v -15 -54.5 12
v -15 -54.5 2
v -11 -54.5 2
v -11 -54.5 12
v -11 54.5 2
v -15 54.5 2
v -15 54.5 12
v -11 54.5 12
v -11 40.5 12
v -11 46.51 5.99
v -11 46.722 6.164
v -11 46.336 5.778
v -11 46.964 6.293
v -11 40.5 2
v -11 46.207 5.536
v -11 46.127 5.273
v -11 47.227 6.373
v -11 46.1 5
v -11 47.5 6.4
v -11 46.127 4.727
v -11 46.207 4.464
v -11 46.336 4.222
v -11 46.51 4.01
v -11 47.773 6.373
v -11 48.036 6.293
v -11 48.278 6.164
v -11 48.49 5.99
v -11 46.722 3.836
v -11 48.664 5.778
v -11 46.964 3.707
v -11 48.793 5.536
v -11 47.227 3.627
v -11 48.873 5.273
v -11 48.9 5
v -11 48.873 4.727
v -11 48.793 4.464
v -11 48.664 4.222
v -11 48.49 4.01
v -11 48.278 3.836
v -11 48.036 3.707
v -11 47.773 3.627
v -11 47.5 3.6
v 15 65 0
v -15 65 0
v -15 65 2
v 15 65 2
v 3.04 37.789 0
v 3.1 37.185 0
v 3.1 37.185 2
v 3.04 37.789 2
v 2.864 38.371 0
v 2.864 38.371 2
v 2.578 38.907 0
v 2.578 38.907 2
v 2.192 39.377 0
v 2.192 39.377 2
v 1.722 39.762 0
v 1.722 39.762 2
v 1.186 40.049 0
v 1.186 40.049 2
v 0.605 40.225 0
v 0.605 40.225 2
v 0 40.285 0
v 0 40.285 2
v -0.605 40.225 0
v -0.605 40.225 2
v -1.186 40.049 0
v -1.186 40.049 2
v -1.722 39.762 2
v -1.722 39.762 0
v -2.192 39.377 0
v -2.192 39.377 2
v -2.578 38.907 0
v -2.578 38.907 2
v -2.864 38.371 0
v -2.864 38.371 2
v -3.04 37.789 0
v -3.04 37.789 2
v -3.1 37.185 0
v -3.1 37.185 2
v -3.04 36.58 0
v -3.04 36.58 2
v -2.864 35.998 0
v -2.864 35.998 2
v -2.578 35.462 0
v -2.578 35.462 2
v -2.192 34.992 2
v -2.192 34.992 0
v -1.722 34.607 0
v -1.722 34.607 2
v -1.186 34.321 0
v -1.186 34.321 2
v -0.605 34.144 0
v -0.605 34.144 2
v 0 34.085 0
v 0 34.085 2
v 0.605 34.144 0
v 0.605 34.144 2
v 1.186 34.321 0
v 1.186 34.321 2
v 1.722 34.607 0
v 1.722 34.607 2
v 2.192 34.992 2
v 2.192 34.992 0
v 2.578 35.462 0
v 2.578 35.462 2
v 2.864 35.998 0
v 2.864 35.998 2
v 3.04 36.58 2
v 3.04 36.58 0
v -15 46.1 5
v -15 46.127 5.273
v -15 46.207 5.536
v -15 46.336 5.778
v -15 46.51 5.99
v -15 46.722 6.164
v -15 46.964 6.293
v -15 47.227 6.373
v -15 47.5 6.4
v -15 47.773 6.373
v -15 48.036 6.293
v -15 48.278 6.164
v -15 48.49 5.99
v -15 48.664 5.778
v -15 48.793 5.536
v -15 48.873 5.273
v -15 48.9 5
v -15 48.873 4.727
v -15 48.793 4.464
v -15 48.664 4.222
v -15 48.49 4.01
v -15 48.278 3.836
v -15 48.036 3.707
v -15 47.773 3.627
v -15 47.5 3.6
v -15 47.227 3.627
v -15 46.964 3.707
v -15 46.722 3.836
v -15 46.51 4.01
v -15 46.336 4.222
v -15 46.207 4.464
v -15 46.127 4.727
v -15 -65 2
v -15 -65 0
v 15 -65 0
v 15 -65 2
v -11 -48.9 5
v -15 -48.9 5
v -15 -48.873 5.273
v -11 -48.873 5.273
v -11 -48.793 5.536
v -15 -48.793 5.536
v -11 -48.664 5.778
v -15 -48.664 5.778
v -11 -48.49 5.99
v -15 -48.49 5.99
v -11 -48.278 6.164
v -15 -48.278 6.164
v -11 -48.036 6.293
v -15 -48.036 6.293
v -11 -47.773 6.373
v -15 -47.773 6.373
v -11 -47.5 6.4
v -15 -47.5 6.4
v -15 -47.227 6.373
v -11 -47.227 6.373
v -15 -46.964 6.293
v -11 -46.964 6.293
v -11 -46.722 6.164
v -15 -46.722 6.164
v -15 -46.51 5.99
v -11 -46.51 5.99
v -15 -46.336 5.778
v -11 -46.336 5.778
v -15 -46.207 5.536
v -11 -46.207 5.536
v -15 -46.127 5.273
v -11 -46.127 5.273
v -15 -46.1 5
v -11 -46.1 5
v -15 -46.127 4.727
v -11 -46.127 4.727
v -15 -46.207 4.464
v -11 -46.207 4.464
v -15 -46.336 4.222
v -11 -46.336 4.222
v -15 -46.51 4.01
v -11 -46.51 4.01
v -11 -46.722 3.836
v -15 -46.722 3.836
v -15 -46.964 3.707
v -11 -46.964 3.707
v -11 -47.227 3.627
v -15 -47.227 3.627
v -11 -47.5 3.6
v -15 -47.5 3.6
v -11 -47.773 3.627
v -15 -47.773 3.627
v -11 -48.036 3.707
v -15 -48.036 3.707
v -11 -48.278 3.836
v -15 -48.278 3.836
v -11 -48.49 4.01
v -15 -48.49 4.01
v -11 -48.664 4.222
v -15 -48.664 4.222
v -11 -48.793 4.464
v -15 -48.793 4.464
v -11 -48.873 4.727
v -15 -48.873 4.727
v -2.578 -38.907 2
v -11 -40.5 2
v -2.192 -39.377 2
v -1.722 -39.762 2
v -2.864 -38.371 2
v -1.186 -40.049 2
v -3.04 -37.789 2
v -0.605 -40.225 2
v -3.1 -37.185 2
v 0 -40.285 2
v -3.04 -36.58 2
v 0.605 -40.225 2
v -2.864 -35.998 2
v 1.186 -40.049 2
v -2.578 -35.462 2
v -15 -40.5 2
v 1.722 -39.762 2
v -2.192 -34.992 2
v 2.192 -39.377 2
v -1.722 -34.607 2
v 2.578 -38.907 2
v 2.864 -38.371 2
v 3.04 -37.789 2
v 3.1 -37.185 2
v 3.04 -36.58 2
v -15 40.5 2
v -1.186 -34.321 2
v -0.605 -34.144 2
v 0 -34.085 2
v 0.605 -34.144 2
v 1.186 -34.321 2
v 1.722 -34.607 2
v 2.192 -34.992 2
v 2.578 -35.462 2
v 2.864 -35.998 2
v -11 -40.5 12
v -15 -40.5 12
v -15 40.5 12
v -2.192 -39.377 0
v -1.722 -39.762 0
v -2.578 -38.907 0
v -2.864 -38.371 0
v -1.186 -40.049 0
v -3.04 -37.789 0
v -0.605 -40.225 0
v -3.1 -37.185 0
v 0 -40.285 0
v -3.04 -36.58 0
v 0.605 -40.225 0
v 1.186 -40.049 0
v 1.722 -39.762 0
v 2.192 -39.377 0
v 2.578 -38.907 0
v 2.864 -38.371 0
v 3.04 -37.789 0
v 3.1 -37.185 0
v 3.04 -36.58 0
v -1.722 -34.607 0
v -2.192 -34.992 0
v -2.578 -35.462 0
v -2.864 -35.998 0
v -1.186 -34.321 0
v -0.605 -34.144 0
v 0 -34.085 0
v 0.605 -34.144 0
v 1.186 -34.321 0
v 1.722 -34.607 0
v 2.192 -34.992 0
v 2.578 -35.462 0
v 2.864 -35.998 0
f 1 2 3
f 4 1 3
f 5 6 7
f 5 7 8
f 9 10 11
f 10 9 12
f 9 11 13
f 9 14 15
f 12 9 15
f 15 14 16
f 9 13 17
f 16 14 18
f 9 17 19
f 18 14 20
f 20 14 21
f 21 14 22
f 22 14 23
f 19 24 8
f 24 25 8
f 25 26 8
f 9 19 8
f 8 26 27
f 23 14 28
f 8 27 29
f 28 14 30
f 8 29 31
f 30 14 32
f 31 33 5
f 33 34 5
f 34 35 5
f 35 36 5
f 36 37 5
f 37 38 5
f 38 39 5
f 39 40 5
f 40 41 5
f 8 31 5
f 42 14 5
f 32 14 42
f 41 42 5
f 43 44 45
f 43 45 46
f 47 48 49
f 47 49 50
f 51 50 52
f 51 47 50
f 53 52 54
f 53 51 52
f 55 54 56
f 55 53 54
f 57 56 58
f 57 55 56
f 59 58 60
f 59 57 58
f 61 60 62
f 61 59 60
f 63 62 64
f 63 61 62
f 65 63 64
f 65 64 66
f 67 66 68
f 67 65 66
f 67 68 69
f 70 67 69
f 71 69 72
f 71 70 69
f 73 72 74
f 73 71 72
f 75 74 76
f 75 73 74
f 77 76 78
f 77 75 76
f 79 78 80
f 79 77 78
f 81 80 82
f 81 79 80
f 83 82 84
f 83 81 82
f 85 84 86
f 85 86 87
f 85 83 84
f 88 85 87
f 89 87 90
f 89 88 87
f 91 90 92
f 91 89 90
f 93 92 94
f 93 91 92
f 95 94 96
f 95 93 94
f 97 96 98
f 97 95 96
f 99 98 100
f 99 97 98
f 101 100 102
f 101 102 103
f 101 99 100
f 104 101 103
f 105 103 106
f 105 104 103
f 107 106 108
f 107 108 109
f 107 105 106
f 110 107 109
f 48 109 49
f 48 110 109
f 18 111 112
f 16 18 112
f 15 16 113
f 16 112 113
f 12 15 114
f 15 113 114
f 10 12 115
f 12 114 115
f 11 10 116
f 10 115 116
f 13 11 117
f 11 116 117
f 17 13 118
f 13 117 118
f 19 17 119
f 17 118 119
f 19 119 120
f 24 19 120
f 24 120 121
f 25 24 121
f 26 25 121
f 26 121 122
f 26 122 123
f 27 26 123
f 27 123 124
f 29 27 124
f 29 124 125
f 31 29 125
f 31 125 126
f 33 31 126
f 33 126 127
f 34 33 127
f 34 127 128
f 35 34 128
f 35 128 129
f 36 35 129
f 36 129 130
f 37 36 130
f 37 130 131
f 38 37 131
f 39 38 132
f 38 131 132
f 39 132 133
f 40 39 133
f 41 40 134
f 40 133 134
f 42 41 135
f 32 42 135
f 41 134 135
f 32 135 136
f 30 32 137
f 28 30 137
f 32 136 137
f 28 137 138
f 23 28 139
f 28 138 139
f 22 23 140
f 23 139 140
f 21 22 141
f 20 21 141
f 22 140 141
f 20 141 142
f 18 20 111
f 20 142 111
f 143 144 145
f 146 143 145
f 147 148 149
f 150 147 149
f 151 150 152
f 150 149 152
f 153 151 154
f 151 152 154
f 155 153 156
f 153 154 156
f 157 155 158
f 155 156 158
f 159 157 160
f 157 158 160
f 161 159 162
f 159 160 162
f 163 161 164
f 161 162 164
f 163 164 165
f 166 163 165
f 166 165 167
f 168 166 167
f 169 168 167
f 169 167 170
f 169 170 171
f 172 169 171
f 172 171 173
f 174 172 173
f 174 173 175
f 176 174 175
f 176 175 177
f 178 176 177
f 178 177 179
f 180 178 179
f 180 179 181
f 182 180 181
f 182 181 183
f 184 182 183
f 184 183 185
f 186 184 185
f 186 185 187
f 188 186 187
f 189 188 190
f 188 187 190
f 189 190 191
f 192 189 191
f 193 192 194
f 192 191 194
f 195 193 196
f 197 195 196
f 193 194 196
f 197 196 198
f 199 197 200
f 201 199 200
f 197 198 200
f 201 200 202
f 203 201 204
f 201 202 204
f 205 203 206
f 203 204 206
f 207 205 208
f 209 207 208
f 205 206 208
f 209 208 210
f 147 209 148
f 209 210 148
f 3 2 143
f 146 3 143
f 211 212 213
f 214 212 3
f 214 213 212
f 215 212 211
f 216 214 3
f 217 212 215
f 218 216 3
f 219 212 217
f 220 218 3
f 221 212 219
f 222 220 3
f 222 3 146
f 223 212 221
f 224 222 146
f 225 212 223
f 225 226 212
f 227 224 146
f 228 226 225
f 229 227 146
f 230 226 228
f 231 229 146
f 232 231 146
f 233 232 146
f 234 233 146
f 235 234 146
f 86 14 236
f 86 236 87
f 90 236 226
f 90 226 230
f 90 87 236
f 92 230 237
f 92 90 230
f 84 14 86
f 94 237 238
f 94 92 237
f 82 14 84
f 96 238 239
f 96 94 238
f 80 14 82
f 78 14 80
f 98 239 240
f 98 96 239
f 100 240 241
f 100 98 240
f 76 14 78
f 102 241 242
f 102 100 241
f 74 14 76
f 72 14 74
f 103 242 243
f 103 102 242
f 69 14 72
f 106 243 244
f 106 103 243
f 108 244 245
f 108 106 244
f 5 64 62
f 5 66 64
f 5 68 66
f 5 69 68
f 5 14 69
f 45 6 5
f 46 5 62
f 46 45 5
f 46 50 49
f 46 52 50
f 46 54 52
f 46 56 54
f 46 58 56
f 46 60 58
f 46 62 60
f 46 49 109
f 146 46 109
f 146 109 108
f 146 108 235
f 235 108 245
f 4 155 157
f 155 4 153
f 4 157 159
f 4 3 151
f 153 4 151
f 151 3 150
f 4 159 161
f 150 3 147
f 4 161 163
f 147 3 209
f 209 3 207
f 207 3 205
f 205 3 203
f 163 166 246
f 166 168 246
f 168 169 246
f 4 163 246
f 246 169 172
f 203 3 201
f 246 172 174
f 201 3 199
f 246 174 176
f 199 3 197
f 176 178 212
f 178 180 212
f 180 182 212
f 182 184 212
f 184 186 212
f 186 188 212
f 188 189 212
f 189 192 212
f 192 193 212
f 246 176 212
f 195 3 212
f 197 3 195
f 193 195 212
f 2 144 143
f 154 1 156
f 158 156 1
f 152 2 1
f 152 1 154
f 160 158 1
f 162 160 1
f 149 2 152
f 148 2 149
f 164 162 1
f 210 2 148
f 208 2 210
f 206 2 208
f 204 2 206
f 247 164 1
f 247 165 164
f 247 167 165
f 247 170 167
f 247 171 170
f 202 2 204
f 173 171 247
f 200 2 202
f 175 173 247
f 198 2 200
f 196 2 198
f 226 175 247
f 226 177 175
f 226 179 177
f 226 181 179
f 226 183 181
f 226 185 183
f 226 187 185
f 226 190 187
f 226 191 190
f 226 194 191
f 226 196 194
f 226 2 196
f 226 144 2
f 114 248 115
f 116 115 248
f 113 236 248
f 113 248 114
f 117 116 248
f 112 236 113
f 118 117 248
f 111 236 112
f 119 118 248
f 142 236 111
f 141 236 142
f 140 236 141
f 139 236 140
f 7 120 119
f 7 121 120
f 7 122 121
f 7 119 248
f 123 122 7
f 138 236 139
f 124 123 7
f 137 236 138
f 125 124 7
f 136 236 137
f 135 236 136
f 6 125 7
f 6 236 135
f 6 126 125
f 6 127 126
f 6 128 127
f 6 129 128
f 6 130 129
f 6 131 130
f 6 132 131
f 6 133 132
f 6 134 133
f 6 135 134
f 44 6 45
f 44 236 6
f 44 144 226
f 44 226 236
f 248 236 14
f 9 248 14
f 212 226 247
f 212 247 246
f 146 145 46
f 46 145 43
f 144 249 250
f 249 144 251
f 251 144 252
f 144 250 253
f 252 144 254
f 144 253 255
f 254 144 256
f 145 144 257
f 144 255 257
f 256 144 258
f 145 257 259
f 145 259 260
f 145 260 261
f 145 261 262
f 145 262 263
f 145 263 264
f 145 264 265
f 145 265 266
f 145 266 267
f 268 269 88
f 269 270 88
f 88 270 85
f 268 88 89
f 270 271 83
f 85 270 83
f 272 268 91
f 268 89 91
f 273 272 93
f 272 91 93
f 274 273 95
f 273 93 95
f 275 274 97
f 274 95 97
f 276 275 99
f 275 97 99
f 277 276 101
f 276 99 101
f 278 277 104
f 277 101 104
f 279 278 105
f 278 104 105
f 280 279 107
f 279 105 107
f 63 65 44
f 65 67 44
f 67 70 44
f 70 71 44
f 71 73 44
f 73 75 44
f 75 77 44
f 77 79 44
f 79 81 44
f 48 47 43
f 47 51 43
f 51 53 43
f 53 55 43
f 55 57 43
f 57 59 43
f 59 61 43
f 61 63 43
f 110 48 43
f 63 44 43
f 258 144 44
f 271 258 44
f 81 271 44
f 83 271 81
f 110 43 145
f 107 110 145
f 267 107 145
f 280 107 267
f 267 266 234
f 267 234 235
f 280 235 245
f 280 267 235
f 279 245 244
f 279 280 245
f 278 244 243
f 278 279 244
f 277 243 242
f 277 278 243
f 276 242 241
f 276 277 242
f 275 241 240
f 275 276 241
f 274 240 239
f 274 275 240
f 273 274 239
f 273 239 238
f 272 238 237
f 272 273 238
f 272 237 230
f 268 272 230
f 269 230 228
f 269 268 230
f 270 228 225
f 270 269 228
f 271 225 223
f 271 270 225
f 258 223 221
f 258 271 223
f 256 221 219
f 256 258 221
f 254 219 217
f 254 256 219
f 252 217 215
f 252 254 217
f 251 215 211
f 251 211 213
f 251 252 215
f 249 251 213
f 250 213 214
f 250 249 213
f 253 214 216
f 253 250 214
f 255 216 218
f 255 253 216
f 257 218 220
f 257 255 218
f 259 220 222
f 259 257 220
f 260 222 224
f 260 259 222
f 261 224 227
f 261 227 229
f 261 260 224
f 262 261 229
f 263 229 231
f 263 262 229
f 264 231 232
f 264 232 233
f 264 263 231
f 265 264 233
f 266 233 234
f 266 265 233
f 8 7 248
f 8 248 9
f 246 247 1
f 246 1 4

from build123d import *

# Parameters (mm, degrees)
SKETCH_W     = 30
SKETCH_H     = 130
SKETCH_R     = 3.1
PAD_DEPTH    = 2
SKETCH001_W  = 4
SKETCH001_H  = 14
PAD001_DEPTH = 10
SKETCH002_R  = 1.4
POCKET_DEPTH = 5


with BuildPart() as part:
    # Sketch → Pad (new body)
    with BuildSketch(Plane.XY):
        Rectangle(SKETCH_W, SKETCH_H)
        with Locations((0, -37.18453)):
            Circle(SKETCH_R, mode=Mode.SUBTRACT)
        with Locations((0, 37.18453)):
            Circle(SKETCH_R, mode=Mode.SUBTRACT)
    extrude(amount=PAD_DEPTH)

    # Sketch001 (on Face8 of Pad) → Pad001 (join)
    with BuildSketch(Plane.XY.offset(2)):
        with Locations((-13, 47.5)):
            Rectangle(SKETCH001_W, SKETCH001_H)
        with Locations((-13, -47.5)):
            Rectangle(SKETCH001_W, SKETCH001_H)
    extrude(amount=PAD001_DEPTH)

    # Sketch002 (on Face7 of Pad001) → Pocket (cut)
    with BuildSketch(Plane(origin=(-15, 0, 0), x_dir=(0, -1, 0), z_dir=(-1, 0, 0))):
        with Locations((-47.5, 5)):
            Circle(SKETCH002_R)
        with Locations((47.5, 5)):
            Circle(SKETCH002_R)
    extrude(amount=-POCKET_DEPTH, mode=Mode.SUBTRACT)


solid = part.part
